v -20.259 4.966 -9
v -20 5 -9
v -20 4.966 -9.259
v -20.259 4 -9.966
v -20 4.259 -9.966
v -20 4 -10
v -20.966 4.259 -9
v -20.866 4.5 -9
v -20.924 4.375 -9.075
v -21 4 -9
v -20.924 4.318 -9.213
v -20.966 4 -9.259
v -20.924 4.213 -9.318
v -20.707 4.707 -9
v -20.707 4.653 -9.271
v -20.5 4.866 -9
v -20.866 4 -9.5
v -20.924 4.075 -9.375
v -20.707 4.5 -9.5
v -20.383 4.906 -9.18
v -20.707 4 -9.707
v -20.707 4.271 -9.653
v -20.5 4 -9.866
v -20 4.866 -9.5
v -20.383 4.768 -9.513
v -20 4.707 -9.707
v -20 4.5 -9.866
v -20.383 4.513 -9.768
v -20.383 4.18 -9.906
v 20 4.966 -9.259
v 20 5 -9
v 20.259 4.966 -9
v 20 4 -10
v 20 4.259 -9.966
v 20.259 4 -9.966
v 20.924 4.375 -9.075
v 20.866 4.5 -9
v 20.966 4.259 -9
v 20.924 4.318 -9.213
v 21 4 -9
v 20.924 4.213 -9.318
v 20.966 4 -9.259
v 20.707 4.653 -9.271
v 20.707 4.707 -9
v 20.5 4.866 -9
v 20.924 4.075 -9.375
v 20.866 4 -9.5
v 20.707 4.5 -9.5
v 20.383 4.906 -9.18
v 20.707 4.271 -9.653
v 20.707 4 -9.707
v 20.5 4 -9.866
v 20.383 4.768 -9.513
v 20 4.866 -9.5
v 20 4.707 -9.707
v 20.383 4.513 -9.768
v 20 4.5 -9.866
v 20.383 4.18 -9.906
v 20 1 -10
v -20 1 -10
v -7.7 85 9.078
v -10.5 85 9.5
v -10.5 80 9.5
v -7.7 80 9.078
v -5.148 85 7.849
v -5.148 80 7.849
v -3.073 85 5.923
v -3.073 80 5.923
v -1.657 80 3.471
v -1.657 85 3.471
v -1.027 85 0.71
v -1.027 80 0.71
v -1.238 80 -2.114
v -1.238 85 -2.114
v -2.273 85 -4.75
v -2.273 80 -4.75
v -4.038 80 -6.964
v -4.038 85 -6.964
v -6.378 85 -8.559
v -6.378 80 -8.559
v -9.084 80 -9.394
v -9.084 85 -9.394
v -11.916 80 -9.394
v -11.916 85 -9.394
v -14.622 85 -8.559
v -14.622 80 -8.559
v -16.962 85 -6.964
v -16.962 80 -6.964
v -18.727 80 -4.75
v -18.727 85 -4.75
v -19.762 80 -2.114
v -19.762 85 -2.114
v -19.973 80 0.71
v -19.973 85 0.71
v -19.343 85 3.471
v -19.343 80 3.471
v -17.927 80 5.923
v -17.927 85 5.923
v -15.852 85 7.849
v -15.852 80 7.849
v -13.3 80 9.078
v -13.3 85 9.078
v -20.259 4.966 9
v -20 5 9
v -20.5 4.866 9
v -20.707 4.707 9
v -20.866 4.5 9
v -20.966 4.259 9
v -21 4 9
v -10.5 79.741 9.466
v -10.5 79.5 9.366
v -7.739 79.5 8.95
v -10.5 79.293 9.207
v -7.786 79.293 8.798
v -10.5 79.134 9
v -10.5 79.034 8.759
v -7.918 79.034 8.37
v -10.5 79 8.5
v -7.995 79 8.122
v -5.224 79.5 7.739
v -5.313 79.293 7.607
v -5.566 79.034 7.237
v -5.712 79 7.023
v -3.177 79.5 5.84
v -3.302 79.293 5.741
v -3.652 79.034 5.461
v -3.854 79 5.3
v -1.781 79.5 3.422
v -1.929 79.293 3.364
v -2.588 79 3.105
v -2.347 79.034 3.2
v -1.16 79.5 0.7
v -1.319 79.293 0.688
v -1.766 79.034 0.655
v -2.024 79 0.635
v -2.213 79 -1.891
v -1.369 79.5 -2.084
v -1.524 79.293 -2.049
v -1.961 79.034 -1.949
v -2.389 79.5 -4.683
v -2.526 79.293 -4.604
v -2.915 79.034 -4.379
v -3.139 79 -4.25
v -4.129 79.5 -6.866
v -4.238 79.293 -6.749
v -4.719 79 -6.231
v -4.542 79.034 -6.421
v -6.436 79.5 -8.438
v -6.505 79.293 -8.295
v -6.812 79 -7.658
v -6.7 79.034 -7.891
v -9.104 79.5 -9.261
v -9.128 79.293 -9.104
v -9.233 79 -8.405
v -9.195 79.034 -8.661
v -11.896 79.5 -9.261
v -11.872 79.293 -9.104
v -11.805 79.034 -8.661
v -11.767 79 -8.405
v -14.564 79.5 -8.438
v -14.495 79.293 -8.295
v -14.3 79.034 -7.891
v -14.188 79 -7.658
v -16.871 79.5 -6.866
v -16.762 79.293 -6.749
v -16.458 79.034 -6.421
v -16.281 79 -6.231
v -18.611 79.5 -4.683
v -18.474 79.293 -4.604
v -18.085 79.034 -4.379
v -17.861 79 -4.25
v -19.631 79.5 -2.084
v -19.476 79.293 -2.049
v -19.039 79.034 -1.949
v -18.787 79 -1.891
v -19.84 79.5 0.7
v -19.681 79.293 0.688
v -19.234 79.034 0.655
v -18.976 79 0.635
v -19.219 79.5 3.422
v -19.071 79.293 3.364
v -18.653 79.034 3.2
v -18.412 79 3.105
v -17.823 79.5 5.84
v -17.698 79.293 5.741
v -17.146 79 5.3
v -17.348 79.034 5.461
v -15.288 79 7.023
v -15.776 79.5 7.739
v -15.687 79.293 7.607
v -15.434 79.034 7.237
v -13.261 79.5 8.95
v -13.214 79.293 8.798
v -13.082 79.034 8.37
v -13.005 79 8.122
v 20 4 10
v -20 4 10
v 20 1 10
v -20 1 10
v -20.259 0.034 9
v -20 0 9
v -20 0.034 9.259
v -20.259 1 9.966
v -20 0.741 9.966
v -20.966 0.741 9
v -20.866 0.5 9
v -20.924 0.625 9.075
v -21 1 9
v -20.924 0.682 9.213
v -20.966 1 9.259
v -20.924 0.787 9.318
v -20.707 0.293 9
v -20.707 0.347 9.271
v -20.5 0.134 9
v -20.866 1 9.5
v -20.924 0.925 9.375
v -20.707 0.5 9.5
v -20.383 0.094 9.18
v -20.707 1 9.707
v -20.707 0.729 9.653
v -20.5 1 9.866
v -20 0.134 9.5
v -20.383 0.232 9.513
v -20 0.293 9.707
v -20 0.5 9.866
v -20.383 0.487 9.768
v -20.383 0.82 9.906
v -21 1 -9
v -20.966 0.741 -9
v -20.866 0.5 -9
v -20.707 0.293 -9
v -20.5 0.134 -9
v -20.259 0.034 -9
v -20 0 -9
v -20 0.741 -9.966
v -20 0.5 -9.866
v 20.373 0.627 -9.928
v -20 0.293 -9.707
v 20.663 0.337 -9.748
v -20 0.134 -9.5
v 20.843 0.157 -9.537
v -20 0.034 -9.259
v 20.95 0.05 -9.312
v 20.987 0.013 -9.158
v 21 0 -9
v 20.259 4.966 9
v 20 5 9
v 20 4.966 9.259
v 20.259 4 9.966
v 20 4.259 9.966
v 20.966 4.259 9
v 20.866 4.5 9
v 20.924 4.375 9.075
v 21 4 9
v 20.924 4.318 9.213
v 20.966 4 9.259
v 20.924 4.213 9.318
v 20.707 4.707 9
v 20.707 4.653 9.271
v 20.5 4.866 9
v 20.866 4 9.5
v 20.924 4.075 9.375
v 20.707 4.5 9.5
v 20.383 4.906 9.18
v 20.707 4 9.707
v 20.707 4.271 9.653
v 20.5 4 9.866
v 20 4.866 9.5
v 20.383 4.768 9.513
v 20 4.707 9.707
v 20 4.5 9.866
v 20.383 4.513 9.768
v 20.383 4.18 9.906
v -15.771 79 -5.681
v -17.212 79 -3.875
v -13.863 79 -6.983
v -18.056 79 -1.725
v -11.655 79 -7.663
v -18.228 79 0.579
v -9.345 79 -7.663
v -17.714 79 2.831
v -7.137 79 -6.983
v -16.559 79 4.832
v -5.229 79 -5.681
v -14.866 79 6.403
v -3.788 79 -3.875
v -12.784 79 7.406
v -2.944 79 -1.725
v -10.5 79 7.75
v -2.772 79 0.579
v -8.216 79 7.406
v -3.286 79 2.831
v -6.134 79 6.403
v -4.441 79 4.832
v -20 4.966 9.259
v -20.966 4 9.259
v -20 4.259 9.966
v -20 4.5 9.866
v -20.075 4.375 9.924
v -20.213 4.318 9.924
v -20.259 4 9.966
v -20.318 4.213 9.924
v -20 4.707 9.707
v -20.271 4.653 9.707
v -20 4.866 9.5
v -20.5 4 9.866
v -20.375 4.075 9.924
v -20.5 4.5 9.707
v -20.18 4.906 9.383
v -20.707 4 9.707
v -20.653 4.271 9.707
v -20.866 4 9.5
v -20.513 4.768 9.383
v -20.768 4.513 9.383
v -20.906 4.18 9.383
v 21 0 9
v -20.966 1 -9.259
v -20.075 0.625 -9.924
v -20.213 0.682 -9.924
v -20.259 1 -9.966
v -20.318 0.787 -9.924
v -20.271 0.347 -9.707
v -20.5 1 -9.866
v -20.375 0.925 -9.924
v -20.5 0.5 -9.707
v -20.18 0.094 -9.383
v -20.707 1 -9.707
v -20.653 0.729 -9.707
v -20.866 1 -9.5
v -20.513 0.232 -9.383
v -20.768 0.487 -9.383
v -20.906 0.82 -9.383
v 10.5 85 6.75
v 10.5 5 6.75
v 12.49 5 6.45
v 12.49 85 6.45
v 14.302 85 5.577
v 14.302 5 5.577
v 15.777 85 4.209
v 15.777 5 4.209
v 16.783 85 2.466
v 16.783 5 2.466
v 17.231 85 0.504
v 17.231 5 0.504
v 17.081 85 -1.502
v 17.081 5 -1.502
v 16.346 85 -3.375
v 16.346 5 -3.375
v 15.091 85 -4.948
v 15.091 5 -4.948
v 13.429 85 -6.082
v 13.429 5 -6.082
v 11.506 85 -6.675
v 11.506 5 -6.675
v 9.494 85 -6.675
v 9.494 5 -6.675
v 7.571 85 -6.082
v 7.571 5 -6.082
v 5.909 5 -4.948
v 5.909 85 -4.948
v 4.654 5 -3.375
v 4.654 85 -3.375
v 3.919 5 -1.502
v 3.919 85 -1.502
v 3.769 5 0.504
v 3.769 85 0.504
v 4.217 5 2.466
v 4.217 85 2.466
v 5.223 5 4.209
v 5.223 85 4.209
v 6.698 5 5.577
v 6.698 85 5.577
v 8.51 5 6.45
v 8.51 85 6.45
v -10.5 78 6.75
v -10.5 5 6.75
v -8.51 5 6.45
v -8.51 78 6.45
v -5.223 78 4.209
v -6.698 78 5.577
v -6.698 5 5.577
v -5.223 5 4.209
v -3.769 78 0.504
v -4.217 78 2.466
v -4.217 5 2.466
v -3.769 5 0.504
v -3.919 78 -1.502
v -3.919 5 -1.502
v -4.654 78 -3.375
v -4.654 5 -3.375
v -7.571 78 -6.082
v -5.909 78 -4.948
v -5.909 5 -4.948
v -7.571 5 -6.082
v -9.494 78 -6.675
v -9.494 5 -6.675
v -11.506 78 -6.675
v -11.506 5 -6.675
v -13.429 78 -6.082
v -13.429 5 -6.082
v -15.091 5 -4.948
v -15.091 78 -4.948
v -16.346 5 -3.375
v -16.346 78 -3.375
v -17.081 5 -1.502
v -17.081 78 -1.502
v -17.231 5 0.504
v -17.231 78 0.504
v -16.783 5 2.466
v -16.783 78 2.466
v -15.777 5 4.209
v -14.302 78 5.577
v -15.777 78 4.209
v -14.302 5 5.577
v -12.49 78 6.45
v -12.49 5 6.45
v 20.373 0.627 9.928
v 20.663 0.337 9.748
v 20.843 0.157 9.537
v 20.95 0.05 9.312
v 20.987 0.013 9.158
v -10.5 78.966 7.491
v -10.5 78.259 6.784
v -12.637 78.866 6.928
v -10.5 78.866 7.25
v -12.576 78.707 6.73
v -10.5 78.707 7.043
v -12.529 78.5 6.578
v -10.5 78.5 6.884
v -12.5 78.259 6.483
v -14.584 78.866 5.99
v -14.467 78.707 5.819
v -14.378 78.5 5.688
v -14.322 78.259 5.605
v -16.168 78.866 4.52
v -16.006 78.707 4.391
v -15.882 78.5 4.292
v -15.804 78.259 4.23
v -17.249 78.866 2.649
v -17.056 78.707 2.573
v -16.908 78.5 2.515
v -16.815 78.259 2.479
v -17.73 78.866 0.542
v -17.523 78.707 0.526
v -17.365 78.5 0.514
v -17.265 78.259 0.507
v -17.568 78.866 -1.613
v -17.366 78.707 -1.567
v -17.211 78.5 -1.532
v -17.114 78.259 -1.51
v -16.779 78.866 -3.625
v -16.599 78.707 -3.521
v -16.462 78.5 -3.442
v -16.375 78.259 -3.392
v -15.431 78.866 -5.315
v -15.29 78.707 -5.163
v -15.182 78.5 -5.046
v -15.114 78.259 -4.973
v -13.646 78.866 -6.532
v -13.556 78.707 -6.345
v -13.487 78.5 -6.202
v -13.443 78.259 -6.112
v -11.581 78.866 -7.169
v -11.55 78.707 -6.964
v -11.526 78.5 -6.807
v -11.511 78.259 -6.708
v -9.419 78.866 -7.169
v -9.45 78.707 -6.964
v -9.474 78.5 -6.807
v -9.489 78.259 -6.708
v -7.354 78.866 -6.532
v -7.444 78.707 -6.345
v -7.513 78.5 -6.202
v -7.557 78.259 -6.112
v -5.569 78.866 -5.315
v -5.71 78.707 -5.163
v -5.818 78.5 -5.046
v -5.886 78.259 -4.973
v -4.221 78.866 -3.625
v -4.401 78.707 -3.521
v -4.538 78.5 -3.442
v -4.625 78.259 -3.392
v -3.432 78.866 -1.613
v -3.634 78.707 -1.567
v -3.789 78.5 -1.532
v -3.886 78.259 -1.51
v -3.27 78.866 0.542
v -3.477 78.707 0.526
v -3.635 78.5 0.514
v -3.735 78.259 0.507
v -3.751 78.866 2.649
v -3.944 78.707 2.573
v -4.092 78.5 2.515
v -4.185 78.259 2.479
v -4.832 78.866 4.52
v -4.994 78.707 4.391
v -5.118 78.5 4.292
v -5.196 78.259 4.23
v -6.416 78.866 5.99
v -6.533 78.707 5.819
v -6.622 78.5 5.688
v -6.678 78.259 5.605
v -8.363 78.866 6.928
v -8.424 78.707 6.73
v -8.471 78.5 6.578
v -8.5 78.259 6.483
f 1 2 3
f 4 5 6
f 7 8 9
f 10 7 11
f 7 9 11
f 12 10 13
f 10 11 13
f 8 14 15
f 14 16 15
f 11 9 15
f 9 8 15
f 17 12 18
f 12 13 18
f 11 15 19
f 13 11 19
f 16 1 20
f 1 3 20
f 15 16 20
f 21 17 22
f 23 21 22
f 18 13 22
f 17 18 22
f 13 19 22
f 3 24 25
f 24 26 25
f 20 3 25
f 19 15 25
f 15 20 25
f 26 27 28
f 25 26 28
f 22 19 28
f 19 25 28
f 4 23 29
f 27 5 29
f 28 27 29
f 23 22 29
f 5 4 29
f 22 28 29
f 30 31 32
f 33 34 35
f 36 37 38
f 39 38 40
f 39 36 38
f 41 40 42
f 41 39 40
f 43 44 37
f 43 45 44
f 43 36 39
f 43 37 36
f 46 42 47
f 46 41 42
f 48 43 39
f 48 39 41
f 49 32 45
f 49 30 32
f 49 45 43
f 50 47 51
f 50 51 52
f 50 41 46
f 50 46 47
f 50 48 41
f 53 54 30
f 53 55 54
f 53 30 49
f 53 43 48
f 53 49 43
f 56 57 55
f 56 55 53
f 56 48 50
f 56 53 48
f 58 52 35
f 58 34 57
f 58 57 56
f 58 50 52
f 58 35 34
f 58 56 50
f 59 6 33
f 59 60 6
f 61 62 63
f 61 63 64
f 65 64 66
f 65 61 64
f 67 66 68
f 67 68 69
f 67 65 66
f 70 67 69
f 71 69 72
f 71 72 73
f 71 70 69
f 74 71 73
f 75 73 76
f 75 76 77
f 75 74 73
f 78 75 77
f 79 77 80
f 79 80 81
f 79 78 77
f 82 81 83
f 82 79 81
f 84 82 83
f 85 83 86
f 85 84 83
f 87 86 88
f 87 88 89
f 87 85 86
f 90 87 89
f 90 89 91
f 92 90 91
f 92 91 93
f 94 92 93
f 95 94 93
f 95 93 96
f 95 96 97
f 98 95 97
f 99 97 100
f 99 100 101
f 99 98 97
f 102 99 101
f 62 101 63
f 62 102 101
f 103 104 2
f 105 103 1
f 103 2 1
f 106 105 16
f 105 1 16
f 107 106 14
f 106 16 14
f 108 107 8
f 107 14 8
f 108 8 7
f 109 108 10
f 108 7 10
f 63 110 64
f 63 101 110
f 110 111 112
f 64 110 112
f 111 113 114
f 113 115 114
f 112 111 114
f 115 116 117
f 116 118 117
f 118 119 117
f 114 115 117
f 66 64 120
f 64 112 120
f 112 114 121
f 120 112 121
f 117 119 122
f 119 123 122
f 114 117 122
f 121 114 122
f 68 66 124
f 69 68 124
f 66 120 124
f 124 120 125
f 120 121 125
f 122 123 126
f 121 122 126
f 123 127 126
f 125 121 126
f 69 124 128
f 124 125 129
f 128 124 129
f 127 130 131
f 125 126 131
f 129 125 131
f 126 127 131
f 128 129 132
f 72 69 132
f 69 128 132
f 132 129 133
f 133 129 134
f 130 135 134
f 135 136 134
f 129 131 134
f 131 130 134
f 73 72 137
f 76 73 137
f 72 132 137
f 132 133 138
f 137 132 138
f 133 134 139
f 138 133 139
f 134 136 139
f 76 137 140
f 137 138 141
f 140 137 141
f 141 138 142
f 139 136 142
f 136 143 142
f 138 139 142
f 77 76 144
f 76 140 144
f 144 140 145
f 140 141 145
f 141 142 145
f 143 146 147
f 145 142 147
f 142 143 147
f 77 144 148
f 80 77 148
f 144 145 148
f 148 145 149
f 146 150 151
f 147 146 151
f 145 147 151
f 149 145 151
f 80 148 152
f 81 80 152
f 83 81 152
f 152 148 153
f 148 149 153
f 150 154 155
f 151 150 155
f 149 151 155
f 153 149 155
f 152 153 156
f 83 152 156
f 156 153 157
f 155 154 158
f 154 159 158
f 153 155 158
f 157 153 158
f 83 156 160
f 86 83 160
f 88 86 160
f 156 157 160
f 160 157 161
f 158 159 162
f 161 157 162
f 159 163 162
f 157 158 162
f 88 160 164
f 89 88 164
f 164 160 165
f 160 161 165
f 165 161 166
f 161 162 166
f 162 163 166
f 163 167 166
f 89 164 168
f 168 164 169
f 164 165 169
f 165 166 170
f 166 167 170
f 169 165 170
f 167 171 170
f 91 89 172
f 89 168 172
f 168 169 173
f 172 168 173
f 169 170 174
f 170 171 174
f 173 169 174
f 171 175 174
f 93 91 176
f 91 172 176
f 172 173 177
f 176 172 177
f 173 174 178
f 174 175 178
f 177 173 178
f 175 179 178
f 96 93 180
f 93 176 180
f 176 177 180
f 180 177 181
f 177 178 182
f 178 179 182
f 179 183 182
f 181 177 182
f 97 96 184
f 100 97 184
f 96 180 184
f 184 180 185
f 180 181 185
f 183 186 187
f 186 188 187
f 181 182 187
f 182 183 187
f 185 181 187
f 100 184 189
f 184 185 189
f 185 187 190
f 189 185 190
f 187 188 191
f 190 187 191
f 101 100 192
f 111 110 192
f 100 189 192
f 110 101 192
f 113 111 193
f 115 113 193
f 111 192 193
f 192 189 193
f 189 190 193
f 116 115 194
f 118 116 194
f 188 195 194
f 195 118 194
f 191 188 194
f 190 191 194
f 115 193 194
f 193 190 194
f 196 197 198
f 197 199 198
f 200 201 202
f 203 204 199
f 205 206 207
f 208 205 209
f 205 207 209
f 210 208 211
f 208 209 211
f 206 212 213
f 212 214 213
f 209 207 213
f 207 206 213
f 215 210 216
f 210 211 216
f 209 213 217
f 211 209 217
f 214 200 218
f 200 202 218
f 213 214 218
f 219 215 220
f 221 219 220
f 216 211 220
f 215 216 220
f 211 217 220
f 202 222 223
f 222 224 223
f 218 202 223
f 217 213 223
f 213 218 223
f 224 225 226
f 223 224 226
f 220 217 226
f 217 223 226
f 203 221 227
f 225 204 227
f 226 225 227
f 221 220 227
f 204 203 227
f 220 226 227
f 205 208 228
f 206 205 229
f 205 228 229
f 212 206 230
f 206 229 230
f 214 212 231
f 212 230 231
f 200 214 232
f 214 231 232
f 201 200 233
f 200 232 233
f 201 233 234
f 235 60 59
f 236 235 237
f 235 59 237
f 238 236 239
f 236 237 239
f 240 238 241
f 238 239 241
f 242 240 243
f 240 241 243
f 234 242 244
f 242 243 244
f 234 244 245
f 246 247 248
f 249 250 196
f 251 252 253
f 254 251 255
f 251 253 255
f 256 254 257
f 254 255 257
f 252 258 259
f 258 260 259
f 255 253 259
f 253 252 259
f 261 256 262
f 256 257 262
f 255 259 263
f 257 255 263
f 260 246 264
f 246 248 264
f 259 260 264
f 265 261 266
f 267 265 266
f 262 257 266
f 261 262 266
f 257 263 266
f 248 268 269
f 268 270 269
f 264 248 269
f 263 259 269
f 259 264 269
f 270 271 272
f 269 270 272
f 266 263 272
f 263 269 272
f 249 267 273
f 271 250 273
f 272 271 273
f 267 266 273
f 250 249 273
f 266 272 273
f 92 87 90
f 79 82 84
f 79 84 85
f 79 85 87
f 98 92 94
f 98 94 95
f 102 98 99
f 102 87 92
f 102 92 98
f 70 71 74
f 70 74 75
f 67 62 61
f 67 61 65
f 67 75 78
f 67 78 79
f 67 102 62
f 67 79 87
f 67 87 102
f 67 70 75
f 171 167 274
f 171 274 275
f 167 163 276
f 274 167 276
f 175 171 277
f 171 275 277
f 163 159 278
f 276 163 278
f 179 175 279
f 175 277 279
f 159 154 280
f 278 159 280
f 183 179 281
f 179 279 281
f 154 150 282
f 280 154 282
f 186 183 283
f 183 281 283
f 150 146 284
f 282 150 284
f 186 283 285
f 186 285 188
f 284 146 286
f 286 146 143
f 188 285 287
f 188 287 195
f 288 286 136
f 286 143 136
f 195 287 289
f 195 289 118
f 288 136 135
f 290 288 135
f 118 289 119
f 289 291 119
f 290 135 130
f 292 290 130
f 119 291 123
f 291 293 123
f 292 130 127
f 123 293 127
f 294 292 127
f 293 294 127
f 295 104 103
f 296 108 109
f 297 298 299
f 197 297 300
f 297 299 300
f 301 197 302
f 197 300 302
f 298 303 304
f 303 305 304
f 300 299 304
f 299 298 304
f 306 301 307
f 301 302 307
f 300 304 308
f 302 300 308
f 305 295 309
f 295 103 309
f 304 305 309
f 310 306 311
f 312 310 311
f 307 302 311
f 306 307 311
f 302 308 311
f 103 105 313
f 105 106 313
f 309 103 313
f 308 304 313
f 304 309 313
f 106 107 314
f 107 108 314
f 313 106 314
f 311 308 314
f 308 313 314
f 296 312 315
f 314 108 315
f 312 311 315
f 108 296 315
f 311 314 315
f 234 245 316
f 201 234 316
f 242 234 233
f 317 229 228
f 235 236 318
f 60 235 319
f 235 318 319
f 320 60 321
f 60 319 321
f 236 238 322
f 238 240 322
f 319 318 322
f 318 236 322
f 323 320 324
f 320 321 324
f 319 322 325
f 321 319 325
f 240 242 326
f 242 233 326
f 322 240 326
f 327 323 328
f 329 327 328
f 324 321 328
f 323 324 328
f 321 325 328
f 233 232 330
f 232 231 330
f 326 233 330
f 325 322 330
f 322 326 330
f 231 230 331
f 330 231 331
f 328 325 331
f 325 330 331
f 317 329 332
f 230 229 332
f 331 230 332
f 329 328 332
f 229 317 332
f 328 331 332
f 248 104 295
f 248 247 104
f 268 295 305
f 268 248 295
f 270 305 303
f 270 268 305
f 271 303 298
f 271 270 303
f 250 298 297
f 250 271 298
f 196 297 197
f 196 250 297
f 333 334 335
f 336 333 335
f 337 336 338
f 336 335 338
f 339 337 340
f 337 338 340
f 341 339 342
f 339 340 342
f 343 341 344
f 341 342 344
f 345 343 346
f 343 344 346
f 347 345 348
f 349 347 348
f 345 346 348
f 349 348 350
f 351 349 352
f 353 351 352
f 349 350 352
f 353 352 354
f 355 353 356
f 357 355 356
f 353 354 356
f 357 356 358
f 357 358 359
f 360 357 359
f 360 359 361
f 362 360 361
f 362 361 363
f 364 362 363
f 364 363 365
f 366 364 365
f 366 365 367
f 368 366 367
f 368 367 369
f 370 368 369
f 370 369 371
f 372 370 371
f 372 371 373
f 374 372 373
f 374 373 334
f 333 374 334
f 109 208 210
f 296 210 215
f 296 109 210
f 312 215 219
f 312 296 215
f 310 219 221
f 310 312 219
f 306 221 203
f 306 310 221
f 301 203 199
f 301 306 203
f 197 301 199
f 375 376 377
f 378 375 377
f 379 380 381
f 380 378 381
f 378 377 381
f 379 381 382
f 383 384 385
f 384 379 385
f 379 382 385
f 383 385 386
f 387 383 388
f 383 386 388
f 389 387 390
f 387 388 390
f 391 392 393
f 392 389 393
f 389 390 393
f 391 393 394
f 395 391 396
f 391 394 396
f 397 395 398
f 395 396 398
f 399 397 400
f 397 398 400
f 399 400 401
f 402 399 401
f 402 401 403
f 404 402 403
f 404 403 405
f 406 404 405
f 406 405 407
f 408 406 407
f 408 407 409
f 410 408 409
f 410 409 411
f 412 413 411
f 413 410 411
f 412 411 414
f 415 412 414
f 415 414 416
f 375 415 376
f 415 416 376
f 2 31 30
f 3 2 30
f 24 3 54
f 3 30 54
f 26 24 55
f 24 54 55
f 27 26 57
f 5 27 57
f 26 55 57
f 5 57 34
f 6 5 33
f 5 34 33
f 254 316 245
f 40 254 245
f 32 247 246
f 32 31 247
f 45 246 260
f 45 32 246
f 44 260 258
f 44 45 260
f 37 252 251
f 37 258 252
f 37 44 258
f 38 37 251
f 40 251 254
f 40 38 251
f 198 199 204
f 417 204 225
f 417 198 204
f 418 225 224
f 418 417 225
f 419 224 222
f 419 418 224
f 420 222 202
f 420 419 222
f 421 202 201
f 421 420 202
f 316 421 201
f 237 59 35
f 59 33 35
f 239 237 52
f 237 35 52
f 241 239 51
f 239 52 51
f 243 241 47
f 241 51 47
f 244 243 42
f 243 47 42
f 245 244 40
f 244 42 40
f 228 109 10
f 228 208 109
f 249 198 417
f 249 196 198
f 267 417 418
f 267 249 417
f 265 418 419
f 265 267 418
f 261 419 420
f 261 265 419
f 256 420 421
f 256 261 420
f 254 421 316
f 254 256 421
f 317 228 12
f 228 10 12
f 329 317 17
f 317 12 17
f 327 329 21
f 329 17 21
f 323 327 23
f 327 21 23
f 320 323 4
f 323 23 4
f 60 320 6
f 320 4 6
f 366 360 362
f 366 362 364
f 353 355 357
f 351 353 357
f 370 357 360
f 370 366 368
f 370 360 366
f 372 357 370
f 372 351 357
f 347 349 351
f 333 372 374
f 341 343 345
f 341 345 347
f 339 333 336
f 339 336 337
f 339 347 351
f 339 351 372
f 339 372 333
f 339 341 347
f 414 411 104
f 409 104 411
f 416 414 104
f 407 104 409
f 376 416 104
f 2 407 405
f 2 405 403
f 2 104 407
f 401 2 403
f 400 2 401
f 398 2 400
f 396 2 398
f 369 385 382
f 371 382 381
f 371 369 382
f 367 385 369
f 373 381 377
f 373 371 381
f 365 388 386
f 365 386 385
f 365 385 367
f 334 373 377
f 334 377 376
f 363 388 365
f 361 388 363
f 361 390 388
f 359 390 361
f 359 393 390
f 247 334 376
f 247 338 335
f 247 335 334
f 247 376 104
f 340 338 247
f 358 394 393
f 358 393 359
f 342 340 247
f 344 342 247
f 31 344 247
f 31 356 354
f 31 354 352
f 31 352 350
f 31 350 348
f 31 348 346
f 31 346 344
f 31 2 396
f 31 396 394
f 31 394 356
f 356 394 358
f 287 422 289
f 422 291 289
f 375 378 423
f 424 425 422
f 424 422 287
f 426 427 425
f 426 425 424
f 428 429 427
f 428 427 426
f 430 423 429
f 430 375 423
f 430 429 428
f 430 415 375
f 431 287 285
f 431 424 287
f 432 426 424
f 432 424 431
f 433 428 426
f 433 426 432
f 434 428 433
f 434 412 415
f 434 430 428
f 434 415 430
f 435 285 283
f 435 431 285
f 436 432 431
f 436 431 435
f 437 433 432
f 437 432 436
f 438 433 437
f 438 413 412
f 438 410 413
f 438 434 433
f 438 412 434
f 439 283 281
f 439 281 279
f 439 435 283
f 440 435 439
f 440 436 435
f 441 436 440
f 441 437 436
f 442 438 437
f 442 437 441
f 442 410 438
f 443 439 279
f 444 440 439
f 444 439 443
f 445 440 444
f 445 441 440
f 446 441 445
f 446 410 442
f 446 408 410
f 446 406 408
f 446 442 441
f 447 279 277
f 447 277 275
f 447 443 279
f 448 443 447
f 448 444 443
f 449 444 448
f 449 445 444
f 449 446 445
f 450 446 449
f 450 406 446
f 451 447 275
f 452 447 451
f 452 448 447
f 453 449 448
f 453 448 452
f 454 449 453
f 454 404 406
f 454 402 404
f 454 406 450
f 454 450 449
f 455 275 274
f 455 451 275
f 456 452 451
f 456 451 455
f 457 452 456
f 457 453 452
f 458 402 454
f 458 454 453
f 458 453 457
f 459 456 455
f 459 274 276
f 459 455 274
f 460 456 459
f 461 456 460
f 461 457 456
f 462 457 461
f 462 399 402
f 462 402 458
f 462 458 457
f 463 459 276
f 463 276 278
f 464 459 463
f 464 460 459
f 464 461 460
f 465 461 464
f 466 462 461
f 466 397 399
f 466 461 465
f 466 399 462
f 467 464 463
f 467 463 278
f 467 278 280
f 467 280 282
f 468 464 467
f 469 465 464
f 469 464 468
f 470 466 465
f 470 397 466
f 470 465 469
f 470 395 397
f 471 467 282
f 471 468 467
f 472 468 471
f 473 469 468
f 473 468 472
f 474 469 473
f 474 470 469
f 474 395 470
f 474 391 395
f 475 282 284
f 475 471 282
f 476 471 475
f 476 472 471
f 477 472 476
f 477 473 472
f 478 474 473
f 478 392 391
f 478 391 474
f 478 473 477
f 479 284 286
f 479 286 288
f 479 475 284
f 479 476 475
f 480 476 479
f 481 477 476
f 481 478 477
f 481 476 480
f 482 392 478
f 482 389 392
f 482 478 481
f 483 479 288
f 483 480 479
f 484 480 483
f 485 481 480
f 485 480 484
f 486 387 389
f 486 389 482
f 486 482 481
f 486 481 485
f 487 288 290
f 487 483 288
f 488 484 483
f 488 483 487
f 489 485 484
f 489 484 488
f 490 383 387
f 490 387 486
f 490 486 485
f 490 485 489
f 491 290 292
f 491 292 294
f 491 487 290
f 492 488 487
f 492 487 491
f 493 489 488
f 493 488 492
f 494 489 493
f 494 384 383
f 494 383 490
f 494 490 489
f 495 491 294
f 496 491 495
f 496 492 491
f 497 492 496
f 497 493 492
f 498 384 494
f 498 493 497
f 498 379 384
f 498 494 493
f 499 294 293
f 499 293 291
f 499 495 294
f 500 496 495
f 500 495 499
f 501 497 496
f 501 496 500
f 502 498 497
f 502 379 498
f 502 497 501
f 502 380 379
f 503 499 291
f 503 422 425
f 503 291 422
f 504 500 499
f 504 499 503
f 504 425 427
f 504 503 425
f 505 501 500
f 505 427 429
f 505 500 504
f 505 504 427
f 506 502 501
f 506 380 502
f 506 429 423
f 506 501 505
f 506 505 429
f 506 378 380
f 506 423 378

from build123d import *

# Parameters (mm, degrees)
SKETCH1_W           = 42
SKETCH1_H           = 20
BOSS_EXTRUDE1_DEPTH = 5
SKETCH1_3_R         = 6.75
BOSS_EXTRUDE2_DEPTH = 85
SKETCH2_R           = 9.5
BOSS_EXTRUDE3_DEPTH = 6
FILLET1_R           = 1


with BuildPart() as part:
    # Sketch1 → Boss-Extrude1 (new body)
    with BuildSketch(Plane(origin=(0, 0, 0), x_dir=(1, 0, 0), z_dir=(0, 1, 0))):
        Rectangle(SKETCH1_W, SKETCH1_H)
    extrude(amount=BOSS_EXTRUDE1_DEPTH)

    # Sketch1<3> → Boss-Extrude2 (add)
    with BuildSketch(Plane(origin=(0, 0, 0), x_dir=(1, 0, 0), z_dir=(0, 1, 0))):
        with Locations((-10.5, 0)):
            Circle(SKETCH1_3_R)
        with Locations((10.5, 0)):
            Circle(SKETCH1_3_R)
    extrude(amount=BOSS_EXTRUDE2_DEPTH)

    # Sketch2 → Boss-Extrude3 (add)
    with BuildSketch(Plane(origin=(0, 85, 0), x_dir=(1, 0, 0), z_dir=(0, 1, 0))):
        with Locations((-10.5, 0)):
            Circle(SKETCH2_R)
    extrude(amount=-BOSS_EXTRUDE3_DEPTH)

    # Fillet1
    fillet1_edges = [part.edges().sort_by_distance(p)[0] for p in [
        (21, 2.5, -10),
        (0, 0, -10),
        (21, 2.5, 10),
        (0, 0, 10),
        (0, 5, 10),
        (0, 5, -10),
        (21, 5, 0),
        (-21, 2.5, -10),
        (-21, 5, 0),
        (-21, 2.5, 10),
        (-21, 0, 0),
        (-20, 79, 0),
        (-17.25, 79, 0),
    ]]
    fillet(fillet1_edges, radius=FILLET1_R)


solid = part.part
